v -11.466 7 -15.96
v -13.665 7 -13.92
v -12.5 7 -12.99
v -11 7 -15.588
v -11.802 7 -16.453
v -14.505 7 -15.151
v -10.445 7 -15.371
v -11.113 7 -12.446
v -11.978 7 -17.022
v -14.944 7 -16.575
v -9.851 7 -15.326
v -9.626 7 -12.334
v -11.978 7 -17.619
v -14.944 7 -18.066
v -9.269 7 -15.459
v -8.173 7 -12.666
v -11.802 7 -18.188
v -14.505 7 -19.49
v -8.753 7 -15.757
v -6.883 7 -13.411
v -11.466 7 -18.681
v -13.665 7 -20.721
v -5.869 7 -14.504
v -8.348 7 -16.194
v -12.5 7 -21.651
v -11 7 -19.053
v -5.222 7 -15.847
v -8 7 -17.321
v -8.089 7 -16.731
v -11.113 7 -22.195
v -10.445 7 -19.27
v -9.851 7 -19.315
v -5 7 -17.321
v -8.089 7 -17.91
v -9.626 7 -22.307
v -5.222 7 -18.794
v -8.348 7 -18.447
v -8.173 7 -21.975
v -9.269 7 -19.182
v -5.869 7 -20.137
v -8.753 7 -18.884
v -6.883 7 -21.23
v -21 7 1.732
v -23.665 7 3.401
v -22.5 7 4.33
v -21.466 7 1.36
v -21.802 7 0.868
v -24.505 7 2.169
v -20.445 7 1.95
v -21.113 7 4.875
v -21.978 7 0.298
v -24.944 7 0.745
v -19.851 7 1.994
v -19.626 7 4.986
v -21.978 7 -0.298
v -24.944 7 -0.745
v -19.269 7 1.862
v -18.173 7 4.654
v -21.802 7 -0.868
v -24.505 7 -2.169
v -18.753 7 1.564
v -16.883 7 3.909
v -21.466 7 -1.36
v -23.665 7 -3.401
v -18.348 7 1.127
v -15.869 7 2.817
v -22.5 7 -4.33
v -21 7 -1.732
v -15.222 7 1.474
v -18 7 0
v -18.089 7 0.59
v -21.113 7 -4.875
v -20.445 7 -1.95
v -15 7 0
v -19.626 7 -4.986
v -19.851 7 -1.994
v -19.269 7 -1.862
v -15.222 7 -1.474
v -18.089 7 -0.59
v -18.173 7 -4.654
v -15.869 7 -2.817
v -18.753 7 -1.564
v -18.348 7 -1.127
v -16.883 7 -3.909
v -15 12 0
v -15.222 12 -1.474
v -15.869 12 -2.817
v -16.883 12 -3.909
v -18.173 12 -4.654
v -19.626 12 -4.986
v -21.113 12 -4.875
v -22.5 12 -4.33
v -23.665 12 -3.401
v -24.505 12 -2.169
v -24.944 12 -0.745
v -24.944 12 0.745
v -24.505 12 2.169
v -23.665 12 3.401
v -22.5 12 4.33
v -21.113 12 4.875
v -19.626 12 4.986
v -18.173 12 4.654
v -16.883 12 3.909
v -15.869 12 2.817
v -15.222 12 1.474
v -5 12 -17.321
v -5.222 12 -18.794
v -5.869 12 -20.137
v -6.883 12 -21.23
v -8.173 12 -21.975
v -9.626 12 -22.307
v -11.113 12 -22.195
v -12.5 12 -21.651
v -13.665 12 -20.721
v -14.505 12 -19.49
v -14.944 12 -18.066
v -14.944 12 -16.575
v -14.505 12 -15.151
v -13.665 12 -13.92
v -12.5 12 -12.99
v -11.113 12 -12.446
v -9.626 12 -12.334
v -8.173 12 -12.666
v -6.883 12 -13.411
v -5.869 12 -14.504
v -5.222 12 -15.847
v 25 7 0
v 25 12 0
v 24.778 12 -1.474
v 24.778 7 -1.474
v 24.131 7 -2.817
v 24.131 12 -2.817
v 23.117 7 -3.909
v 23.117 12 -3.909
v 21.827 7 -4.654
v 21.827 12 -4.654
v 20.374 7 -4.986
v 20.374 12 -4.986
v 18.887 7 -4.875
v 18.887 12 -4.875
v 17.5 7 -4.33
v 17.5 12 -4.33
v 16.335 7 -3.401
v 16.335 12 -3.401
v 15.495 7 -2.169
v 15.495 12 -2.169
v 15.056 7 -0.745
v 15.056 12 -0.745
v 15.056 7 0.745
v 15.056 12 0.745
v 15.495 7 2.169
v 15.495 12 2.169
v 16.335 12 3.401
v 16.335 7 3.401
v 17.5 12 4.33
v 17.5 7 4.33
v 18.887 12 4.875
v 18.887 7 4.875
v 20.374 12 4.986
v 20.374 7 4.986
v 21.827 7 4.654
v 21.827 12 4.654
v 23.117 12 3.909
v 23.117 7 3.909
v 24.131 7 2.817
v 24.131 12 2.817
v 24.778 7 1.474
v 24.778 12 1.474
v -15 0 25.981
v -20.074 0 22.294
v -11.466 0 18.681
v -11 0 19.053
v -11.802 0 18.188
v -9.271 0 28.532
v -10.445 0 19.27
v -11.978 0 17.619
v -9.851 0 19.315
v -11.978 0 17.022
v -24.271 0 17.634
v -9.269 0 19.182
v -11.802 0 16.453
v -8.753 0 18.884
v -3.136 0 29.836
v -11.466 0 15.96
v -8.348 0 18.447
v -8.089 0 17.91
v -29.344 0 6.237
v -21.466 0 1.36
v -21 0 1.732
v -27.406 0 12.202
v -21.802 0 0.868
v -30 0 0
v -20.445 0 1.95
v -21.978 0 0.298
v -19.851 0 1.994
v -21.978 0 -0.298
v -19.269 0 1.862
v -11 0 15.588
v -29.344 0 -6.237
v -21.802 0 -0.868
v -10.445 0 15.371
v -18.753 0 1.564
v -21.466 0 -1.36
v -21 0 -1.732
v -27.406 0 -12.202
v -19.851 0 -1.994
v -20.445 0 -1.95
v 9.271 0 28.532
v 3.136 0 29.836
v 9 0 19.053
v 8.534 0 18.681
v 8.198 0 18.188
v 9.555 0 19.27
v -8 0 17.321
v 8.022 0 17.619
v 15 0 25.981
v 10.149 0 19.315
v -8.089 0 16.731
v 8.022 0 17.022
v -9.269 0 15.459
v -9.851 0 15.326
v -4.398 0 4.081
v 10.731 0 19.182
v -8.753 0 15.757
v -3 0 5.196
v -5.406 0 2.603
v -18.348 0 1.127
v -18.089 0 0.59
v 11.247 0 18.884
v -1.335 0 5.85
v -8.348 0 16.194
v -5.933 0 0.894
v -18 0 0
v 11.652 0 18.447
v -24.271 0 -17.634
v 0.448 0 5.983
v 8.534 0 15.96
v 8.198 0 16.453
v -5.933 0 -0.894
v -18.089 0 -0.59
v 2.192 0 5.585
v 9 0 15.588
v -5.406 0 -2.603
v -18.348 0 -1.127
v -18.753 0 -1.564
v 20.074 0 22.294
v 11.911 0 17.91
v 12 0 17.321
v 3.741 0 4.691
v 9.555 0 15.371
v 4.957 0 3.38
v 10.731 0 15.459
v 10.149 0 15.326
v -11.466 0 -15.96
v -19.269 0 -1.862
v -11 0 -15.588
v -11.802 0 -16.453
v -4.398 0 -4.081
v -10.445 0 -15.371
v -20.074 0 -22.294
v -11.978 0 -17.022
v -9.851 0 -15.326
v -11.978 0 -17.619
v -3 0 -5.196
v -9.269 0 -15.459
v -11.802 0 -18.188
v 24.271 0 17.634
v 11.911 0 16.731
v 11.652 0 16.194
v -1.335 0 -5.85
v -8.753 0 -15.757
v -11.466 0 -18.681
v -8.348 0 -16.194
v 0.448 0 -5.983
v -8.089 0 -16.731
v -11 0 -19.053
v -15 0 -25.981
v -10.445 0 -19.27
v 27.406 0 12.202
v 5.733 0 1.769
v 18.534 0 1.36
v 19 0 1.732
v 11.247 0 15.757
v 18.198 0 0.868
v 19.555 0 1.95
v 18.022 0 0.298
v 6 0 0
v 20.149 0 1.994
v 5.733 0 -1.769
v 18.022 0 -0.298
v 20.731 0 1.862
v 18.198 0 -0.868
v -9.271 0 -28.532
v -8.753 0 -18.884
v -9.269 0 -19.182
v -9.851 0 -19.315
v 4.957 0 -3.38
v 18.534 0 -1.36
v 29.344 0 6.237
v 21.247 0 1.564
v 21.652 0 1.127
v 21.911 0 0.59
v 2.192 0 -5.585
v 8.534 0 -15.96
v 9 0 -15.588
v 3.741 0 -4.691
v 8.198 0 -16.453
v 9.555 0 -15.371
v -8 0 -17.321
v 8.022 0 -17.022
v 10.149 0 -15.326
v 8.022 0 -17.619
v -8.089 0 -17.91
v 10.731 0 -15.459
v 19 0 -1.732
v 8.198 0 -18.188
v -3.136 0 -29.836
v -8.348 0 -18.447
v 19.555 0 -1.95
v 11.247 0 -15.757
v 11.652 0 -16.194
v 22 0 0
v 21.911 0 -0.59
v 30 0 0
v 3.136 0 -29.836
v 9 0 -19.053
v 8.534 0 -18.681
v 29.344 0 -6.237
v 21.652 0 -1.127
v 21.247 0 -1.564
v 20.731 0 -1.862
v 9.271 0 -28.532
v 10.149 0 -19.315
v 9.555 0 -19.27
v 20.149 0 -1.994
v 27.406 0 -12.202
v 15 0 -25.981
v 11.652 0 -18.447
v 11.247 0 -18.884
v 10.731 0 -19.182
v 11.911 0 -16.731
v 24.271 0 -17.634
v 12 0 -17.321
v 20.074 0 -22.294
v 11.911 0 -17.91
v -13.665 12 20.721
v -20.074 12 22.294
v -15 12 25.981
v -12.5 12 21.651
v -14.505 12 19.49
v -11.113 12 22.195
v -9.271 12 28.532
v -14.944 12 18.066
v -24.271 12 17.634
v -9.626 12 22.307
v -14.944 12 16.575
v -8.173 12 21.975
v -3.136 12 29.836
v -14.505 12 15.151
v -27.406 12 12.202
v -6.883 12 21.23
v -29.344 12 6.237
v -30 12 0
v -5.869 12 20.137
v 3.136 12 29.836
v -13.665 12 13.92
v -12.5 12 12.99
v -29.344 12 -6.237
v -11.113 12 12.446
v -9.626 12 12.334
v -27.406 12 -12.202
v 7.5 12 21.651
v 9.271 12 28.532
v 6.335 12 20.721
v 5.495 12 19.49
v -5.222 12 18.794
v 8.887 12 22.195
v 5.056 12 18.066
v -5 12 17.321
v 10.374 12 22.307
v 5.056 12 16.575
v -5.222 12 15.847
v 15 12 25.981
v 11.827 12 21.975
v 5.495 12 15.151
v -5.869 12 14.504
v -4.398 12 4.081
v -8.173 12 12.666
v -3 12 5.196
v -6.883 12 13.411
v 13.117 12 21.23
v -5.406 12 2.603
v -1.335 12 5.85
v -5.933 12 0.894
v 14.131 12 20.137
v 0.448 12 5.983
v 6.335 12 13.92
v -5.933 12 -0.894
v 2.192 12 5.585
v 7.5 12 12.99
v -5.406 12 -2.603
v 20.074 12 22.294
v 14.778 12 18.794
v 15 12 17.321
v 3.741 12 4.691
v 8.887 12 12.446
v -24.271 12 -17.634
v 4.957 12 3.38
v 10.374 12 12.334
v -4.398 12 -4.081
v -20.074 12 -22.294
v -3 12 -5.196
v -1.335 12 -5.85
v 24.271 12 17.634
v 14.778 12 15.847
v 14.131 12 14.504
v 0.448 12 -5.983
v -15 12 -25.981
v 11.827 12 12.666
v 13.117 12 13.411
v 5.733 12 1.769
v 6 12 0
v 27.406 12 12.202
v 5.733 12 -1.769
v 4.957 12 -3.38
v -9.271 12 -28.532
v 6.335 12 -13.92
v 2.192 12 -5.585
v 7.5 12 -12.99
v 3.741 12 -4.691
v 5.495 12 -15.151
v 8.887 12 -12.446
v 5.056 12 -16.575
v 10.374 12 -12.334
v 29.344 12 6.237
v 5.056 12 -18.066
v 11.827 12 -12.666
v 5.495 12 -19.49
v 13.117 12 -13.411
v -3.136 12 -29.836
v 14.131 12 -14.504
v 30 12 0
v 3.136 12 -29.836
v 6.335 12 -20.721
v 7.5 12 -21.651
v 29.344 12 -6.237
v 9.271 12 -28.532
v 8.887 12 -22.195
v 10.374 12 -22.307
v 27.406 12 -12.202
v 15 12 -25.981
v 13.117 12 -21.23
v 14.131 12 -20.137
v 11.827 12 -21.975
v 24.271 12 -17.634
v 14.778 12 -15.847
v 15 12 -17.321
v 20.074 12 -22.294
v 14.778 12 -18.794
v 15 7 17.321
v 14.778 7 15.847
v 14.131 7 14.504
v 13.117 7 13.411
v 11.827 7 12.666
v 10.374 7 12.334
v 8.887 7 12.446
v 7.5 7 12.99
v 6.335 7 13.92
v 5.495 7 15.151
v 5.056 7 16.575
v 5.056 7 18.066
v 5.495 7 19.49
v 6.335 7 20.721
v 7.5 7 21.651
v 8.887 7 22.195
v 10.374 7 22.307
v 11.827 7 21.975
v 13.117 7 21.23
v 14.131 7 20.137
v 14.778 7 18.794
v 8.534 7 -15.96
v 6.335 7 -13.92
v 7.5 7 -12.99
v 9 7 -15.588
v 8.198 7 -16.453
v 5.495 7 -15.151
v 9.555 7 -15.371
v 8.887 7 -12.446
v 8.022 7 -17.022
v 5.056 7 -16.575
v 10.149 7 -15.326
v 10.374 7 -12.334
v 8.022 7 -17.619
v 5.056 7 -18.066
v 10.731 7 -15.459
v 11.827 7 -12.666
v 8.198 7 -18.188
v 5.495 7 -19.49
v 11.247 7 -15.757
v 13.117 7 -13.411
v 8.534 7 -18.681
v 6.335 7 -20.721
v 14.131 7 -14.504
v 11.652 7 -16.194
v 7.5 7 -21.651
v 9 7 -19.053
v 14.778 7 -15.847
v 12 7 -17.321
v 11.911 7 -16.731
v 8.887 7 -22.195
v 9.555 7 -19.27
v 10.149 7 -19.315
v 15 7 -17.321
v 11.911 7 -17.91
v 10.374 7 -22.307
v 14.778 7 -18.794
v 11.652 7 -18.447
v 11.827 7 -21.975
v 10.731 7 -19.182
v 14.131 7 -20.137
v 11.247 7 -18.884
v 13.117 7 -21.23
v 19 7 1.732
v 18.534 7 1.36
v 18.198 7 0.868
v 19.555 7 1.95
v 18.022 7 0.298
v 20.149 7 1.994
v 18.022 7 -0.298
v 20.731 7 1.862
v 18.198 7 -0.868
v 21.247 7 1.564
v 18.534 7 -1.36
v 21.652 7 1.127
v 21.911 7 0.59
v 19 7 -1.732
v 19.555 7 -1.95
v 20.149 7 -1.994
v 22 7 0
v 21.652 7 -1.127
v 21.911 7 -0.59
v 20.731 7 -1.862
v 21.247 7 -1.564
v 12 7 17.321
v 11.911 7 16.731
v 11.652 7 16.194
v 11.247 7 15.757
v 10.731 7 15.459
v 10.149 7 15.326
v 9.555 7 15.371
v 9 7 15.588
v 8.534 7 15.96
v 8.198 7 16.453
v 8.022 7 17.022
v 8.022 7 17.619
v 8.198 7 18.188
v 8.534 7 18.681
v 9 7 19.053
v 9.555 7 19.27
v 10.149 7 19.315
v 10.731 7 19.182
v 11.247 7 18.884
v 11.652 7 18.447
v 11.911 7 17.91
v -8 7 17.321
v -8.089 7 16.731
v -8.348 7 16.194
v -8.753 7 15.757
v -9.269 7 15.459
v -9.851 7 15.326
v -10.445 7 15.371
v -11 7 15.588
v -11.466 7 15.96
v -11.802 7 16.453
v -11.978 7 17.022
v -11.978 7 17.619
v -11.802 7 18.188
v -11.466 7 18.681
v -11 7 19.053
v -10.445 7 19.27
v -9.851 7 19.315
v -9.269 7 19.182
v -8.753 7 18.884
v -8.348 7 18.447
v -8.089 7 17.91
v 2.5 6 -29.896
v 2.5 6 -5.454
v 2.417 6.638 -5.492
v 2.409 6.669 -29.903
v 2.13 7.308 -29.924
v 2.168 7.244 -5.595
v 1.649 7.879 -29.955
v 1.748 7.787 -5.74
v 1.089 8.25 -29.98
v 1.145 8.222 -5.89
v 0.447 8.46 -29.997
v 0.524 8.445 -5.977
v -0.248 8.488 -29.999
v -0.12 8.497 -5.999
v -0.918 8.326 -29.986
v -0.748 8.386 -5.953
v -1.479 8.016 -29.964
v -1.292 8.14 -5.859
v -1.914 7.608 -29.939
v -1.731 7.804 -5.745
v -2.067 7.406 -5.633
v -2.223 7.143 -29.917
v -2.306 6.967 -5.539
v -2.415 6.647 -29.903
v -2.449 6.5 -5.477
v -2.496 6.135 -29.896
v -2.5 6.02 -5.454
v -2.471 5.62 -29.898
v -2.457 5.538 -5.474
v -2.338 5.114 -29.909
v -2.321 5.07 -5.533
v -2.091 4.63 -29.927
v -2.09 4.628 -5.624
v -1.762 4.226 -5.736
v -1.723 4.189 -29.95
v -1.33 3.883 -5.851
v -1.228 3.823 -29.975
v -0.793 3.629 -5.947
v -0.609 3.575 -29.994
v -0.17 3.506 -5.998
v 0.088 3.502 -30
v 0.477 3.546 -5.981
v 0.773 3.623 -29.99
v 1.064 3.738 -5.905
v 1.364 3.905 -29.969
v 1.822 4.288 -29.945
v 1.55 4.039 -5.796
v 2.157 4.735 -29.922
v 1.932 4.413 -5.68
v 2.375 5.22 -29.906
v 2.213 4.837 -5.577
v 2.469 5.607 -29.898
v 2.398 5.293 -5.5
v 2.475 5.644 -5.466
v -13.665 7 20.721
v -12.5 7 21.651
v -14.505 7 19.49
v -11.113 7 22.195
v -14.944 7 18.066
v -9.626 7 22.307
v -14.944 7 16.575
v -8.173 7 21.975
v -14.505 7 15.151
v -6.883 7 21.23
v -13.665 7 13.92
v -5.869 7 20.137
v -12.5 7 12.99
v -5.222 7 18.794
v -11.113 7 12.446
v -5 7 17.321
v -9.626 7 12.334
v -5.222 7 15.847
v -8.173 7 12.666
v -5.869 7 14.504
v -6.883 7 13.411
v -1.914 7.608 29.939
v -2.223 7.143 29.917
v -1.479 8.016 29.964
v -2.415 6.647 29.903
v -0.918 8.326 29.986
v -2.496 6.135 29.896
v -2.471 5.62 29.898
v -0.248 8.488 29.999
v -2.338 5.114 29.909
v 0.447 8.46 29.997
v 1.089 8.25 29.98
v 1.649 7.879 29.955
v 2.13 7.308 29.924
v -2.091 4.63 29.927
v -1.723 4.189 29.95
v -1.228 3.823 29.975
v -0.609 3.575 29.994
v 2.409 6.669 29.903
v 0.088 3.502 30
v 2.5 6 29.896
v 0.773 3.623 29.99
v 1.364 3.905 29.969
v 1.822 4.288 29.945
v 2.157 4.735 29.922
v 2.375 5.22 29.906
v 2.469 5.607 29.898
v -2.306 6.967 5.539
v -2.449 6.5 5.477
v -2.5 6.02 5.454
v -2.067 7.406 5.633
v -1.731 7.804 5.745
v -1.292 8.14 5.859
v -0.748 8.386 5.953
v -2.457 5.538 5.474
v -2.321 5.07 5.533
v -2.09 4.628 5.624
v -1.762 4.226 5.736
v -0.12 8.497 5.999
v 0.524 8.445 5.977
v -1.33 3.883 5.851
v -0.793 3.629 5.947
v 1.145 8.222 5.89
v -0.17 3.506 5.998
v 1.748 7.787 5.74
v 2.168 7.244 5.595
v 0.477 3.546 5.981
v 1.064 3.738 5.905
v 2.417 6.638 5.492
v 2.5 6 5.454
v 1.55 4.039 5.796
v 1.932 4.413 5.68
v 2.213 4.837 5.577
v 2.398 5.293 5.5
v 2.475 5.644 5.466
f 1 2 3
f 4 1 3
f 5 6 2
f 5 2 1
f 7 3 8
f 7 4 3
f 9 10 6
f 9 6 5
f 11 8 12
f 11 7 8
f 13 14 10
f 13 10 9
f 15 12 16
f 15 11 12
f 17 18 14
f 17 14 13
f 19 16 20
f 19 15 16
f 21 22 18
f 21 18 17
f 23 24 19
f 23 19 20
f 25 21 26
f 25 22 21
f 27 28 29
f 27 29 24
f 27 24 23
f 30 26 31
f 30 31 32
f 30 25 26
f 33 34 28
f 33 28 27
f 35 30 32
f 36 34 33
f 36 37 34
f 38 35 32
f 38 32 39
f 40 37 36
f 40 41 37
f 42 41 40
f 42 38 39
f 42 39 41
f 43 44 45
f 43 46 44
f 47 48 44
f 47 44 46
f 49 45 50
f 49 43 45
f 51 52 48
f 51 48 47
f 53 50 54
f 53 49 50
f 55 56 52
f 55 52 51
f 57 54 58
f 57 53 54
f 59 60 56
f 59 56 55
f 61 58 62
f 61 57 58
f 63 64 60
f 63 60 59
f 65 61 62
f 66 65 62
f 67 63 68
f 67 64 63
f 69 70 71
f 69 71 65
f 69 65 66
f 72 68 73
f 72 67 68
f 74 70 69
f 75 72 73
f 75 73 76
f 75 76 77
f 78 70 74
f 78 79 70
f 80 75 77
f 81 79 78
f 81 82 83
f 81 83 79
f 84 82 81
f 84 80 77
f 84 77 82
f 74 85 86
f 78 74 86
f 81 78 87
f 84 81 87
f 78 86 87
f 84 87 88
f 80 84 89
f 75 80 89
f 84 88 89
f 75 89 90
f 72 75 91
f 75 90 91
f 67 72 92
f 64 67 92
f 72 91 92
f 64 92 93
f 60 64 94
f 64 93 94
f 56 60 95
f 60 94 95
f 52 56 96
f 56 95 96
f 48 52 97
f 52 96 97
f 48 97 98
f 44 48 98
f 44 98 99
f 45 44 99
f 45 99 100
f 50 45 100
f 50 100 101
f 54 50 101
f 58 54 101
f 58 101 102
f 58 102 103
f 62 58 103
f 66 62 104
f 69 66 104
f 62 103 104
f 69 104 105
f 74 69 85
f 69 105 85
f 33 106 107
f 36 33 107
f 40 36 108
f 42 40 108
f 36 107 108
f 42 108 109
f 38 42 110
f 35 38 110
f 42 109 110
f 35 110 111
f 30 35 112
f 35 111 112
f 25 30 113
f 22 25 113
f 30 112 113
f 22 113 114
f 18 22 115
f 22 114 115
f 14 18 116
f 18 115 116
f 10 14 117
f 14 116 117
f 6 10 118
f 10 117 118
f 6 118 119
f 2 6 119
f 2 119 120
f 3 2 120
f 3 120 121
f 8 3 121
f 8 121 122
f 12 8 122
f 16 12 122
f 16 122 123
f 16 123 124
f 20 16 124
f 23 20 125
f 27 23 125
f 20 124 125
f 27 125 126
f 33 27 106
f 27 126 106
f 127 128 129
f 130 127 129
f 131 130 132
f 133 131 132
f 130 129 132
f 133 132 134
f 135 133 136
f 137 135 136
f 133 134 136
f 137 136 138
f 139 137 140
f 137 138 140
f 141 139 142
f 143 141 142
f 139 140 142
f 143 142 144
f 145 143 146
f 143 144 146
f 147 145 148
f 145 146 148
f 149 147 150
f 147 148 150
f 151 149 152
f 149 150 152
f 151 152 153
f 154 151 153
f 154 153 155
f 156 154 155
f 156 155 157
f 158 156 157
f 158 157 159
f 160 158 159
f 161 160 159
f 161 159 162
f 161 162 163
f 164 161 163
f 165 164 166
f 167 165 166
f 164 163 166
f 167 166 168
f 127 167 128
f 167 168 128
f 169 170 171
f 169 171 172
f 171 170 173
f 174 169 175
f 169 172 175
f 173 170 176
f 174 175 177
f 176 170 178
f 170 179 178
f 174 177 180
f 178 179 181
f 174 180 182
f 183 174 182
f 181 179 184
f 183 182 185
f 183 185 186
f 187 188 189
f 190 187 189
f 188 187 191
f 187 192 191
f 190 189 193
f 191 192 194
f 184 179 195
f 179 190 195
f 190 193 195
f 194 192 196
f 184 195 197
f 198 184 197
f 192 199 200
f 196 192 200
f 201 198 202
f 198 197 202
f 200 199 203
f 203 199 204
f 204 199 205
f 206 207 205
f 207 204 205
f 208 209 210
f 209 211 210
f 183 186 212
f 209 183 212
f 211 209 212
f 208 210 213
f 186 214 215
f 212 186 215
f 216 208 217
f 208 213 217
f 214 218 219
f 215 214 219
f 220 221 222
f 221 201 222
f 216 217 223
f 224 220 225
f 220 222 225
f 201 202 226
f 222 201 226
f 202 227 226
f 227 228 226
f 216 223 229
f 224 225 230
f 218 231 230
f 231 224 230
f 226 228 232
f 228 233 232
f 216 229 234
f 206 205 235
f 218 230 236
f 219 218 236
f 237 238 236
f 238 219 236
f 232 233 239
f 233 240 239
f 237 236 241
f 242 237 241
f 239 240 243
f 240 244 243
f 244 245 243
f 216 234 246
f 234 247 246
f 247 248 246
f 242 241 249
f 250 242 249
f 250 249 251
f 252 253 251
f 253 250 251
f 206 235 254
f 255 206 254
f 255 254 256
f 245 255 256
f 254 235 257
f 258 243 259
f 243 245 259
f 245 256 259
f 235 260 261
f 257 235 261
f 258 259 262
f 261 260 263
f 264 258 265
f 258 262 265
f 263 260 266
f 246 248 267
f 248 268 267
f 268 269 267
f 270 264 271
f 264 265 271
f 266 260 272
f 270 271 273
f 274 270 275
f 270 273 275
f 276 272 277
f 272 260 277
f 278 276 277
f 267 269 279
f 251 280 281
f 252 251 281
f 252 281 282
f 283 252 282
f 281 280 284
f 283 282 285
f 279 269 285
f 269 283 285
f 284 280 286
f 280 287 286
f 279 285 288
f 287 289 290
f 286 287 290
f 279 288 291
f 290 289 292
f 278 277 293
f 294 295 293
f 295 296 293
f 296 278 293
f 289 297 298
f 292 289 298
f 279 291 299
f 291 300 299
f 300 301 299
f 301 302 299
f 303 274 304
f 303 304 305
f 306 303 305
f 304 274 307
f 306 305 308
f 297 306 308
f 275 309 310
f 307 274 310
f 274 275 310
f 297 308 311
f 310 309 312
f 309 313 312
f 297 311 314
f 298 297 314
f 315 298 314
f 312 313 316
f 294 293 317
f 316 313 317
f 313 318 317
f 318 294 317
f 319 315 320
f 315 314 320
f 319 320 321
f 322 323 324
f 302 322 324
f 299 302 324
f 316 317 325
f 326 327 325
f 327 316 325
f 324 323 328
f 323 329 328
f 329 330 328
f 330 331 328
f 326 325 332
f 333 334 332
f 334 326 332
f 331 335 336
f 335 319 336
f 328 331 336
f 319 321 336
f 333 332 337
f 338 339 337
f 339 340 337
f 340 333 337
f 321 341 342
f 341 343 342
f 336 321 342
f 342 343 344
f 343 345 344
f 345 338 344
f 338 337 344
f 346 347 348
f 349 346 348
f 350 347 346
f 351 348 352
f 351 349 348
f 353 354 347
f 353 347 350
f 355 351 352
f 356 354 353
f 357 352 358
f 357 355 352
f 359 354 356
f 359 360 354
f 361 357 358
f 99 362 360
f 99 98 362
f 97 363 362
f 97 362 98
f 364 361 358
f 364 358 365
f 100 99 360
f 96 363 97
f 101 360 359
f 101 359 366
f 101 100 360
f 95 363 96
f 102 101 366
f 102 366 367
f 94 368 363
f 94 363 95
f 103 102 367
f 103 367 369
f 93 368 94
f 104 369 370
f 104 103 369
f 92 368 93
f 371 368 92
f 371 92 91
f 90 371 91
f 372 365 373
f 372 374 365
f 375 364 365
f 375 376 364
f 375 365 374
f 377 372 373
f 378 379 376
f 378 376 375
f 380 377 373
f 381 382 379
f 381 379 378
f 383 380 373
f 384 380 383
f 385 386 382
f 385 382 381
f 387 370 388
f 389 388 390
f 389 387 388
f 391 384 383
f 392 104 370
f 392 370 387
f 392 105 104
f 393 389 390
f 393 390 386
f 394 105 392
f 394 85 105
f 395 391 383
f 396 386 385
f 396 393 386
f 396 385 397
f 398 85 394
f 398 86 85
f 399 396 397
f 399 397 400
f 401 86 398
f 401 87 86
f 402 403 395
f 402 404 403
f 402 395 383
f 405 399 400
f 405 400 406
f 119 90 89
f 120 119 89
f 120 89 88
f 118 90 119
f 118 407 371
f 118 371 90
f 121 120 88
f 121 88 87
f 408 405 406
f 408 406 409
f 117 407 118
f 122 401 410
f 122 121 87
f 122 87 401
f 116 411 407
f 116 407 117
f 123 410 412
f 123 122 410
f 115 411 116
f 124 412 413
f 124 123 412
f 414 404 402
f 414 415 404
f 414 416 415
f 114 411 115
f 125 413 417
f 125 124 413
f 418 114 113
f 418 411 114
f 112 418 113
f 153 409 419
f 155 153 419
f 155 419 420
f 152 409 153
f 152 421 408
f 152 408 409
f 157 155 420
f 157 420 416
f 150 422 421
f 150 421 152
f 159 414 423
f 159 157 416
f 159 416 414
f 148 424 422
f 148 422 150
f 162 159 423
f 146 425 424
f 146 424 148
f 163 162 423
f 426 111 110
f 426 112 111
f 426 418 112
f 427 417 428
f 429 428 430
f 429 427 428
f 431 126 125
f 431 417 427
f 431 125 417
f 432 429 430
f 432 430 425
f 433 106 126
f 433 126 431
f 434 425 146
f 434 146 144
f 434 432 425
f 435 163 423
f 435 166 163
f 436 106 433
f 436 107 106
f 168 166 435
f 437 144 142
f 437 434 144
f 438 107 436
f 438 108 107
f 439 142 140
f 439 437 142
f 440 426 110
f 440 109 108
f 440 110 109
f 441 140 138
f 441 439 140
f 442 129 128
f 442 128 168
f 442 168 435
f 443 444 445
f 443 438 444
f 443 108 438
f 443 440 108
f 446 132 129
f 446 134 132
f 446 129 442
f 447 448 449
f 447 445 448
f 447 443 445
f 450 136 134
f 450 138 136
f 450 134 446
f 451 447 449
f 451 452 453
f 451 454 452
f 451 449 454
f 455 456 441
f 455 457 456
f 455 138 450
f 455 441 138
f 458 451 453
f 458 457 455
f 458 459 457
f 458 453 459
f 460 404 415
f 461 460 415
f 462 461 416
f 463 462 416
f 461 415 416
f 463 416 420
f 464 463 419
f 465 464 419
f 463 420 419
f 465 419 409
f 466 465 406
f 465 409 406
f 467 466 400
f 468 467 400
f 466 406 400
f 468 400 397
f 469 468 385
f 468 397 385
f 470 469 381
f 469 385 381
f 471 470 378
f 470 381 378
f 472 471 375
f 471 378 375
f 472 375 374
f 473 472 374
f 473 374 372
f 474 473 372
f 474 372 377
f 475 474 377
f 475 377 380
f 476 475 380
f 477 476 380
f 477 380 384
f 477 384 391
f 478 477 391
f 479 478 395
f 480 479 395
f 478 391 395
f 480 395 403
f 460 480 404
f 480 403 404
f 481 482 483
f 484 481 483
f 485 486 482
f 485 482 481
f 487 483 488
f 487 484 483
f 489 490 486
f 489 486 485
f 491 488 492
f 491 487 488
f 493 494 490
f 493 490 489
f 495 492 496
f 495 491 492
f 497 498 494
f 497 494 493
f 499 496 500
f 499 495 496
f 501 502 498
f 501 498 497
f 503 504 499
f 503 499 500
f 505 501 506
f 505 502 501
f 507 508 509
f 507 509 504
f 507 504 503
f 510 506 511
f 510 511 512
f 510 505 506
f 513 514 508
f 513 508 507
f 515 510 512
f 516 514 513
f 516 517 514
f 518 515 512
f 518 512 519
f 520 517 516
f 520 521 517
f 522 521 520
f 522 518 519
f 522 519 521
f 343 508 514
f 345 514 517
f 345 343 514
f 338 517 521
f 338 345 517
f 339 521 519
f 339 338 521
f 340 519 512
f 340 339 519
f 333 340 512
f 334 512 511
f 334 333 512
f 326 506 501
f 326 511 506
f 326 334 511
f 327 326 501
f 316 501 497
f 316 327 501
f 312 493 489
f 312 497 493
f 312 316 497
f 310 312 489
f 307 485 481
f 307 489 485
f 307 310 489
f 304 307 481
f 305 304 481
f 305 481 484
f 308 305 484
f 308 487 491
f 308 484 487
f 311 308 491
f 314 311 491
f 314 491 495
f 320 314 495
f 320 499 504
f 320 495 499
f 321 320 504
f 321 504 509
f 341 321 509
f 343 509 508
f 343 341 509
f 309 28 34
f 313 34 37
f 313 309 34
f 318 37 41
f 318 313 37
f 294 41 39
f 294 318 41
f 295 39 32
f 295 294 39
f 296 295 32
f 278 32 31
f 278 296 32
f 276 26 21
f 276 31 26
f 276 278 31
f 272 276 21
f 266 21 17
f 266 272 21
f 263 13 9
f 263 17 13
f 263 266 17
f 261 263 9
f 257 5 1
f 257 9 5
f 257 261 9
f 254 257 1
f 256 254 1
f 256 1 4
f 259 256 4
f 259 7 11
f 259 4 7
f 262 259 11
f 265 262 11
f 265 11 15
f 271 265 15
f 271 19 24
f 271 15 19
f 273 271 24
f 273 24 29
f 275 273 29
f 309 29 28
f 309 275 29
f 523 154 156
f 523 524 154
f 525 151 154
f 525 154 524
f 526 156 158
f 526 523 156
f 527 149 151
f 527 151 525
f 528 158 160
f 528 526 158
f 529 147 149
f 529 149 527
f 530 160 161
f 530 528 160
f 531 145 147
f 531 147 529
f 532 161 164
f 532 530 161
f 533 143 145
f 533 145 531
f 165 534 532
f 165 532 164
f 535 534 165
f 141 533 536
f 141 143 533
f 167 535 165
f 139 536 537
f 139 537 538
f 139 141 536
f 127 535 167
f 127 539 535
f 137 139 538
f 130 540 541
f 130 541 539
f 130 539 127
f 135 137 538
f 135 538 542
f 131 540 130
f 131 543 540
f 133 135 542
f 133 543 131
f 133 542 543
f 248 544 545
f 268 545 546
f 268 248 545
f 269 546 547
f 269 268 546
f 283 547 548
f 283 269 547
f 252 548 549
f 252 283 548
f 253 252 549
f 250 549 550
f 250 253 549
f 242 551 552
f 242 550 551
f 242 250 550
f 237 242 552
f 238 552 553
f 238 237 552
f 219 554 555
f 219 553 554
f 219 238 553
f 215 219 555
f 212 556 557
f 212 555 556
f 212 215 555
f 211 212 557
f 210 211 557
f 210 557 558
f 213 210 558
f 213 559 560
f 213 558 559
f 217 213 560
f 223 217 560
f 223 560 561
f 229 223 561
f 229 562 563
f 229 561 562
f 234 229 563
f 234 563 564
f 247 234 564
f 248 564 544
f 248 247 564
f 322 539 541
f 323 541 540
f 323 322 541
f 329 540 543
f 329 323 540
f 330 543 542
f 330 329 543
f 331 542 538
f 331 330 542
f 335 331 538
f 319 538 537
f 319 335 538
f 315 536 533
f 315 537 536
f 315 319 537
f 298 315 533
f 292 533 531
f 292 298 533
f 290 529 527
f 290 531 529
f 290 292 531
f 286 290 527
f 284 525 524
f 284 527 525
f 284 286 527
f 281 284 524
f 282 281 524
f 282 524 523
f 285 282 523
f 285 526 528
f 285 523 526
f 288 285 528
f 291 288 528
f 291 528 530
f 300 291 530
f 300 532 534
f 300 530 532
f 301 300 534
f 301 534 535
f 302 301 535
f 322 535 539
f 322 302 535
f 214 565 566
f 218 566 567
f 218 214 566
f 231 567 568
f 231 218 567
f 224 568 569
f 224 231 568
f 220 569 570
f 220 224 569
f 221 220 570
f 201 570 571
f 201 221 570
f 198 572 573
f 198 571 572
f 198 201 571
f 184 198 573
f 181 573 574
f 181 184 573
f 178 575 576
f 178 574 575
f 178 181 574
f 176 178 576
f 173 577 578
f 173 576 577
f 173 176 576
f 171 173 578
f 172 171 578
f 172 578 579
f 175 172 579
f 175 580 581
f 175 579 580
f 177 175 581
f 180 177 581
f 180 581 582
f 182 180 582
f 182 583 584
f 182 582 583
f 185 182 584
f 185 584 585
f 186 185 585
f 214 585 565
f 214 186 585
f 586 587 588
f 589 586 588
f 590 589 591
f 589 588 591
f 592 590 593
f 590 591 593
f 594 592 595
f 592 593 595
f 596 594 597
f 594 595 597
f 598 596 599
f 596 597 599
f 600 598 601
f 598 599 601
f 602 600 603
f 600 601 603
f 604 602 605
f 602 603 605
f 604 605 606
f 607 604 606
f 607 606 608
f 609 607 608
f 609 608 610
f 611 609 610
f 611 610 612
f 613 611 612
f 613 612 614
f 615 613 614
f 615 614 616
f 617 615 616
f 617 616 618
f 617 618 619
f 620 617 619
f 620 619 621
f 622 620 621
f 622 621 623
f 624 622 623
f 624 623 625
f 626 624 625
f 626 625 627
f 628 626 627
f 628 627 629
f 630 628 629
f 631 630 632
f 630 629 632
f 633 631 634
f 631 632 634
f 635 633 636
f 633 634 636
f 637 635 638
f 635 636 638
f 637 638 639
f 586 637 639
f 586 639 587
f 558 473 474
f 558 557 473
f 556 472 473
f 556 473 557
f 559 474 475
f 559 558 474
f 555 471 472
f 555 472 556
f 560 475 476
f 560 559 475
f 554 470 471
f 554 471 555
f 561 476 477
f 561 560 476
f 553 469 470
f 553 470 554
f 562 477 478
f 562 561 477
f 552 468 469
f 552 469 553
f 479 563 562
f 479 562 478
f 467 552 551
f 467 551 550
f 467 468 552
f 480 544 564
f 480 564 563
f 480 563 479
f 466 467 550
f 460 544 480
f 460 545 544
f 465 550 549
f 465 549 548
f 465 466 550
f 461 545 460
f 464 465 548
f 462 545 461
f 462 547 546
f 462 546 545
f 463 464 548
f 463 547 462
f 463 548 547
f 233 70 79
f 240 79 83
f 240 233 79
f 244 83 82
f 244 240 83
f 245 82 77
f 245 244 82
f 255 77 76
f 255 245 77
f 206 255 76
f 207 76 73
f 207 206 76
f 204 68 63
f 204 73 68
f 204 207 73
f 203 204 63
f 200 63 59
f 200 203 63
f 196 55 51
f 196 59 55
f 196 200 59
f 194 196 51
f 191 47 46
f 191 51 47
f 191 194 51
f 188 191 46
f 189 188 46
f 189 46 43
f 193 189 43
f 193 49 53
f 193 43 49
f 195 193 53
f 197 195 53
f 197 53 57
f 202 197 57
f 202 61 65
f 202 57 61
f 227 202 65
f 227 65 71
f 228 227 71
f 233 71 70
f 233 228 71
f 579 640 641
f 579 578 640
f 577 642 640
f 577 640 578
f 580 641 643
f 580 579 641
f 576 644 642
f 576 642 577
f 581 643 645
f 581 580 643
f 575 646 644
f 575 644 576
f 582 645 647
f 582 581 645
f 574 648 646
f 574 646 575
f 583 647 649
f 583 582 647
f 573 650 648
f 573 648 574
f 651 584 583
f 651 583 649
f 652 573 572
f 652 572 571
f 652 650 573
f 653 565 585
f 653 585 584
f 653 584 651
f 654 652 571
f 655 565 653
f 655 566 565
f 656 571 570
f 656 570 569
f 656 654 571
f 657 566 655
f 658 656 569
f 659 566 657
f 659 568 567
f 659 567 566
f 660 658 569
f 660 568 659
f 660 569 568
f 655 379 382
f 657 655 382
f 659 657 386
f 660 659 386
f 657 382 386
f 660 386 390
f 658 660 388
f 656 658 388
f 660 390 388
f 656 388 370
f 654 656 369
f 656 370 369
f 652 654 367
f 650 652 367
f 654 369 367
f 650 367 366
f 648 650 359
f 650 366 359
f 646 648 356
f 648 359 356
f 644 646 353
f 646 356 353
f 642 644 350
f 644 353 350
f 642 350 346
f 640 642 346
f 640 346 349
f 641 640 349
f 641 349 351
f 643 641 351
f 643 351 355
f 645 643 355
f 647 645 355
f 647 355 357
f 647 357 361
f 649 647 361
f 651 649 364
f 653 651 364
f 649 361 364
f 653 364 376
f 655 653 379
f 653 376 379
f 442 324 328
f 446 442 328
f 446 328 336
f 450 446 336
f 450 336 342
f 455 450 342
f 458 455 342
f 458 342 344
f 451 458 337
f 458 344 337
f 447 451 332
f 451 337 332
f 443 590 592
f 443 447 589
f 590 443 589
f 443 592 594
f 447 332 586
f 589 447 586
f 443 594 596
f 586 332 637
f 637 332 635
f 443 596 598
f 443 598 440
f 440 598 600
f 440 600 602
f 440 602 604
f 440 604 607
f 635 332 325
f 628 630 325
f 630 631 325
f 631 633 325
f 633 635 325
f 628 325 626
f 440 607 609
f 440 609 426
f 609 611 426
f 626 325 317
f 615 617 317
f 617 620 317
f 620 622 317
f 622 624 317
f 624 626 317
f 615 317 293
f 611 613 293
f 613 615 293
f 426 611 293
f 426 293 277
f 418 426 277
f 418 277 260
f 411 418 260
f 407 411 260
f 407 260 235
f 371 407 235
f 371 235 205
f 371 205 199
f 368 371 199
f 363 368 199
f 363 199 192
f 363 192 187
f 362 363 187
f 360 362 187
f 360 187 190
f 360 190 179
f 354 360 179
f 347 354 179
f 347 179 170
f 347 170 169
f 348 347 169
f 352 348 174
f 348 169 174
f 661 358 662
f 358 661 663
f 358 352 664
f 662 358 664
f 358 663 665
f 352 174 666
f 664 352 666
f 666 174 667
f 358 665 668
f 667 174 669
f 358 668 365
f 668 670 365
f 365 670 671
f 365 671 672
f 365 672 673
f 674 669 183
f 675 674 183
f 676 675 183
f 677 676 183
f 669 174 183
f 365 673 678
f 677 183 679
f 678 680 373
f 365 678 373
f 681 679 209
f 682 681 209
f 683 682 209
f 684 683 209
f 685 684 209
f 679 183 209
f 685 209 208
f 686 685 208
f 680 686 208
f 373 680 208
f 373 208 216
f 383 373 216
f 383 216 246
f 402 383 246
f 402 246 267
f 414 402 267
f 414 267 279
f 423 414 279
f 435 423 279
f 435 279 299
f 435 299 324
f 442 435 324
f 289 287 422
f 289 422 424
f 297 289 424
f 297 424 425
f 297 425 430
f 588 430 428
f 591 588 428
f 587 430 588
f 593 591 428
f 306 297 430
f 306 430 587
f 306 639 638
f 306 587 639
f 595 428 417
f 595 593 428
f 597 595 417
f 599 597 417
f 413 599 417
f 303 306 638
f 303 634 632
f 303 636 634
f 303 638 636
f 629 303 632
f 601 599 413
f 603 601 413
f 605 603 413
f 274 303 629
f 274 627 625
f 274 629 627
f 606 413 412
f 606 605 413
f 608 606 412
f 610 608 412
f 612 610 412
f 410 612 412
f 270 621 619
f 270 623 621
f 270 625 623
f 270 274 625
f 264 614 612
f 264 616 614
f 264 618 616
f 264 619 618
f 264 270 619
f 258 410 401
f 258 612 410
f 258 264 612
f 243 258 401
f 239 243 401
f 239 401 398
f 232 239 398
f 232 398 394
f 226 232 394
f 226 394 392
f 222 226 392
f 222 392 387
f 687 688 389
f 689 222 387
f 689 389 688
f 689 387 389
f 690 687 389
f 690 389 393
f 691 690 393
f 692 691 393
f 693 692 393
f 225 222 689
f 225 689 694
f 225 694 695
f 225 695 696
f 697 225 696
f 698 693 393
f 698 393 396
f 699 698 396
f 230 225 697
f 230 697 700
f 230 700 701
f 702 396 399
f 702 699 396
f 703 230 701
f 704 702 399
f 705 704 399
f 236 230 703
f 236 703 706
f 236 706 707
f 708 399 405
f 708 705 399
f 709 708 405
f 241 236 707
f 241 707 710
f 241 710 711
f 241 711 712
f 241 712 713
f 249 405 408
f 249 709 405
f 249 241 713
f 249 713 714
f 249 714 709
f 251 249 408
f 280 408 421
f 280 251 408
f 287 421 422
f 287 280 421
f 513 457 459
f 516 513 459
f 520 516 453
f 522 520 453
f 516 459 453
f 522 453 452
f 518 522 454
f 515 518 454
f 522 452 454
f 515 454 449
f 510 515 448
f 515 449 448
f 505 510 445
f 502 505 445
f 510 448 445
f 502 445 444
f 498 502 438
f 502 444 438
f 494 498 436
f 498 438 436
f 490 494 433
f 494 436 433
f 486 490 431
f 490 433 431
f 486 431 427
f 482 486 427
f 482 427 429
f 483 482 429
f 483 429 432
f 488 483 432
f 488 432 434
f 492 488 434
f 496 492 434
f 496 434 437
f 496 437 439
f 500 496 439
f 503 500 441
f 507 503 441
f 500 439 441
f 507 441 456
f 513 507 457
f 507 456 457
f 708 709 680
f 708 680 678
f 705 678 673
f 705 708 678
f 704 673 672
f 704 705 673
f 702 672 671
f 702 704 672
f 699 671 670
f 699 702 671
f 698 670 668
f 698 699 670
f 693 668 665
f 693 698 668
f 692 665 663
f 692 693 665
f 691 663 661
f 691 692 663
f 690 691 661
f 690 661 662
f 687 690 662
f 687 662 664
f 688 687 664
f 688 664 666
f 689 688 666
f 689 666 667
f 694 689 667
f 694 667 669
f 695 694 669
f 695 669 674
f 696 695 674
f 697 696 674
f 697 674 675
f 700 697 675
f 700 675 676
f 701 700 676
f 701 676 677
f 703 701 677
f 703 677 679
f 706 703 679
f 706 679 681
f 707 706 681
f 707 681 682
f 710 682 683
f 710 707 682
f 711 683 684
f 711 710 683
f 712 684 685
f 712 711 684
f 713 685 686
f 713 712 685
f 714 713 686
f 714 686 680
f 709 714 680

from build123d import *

# Parameters (mm, degrees)
SKETCH1_R               = 30
SKETCH1_R_2             = 2
SKETCH1_R_3             = 6
BOSS_EXTRUDE1_DEPTH     = 12
SKETCH2_R               = 2.5
CUT_EXTRUDE1_DEPTH      = 31
CUT_EXTRUDE1_DEPTH_BACK = 31
SKETCH3_R               = 5
CUT_EXTRUDE2_DEPTH      = 5


with BuildPart() as part:
    # Sketch1 → Boss-Extrude1 (new body)
    with BuildSketch(Plane(origin=(0, 0, 0), x_dir=(1, 0, 0), z_dir=(0, 1, 0))):
        Circle(SKETCH1_R)
        with Locations((20, 0)):
            Circle(SKETCH1_R_2, mode=Mode.SUBTRACT)
        with Locations((10, -17.320508076)):
            Circle(SKETCH1_R_2, mode=Mode.SUBTRACT)
        with Locations((-10, -17.320508076)):
            Circle(SKETCH1_R_2, mode=Mode.SUBTRACT)
        with Locations((-20, 0)):
            Circle(SKETCH1_R_2, mode=Mode.SUBTRACT)
        with Locations((-10, 17.320508076)):
            Circle(SKETCH1_R_2, mode=Mode.SUBTRACT)
        with Locations((10, 17.320508076)):
            Circle(SKETCH1_R_2, mode=Mode.SUBTRACT)
        Circle(SKETCH1_R_3, mode=Mode.SUBTRACT)
    extrude(amount=BOSS_EXTRUDE1_DEPTH)

    # Sketch2 → Cut-Extrude1 (cut, two sides)
    with BuildSketch(Plane.XY) as cut_extrude1_sk:
        with Locations((0, 6)):
            Circle(SKETCH2_R)
    extrude(amount=CUT_EXTRUDE1_DEPTH, mode=Mode.SUBTRACT)
    extrude(cut_extrude1_sk.sketch, amount=-CUT_EXTRUDE1_DEPTH_BACK, mode=Mode.SUBTRACT)

    # Sketch3 → Cut-Extrude2 (cut)
    with BuildSketch(Plane(origin=(0, 12, 0), x_dir=(1, 0, 0), z_dir=(0, 1, 0))):
        with Locations((-10, 17.320508076)):
            Circle(SKETCH3_R)
        with Locations((10, 17.320508076)):
            Circle(SKETCH3_R)
        with Locations((20, 0)):
            Circle(SKETCH3_R)
        with Locations((10, -17.320508076)):
            Circle(SKETCH3_R)
        with Locations((-10, -17.320508076)):
            Circle(SKETCH3_R)
        with Locations((-20, 0)):
            Circle(SKETCH3_R)
    extrude(amount=-CUT_EXTRUDE2_DEPTH, mode=Mode.SUBTRACT)


solid = part.part
